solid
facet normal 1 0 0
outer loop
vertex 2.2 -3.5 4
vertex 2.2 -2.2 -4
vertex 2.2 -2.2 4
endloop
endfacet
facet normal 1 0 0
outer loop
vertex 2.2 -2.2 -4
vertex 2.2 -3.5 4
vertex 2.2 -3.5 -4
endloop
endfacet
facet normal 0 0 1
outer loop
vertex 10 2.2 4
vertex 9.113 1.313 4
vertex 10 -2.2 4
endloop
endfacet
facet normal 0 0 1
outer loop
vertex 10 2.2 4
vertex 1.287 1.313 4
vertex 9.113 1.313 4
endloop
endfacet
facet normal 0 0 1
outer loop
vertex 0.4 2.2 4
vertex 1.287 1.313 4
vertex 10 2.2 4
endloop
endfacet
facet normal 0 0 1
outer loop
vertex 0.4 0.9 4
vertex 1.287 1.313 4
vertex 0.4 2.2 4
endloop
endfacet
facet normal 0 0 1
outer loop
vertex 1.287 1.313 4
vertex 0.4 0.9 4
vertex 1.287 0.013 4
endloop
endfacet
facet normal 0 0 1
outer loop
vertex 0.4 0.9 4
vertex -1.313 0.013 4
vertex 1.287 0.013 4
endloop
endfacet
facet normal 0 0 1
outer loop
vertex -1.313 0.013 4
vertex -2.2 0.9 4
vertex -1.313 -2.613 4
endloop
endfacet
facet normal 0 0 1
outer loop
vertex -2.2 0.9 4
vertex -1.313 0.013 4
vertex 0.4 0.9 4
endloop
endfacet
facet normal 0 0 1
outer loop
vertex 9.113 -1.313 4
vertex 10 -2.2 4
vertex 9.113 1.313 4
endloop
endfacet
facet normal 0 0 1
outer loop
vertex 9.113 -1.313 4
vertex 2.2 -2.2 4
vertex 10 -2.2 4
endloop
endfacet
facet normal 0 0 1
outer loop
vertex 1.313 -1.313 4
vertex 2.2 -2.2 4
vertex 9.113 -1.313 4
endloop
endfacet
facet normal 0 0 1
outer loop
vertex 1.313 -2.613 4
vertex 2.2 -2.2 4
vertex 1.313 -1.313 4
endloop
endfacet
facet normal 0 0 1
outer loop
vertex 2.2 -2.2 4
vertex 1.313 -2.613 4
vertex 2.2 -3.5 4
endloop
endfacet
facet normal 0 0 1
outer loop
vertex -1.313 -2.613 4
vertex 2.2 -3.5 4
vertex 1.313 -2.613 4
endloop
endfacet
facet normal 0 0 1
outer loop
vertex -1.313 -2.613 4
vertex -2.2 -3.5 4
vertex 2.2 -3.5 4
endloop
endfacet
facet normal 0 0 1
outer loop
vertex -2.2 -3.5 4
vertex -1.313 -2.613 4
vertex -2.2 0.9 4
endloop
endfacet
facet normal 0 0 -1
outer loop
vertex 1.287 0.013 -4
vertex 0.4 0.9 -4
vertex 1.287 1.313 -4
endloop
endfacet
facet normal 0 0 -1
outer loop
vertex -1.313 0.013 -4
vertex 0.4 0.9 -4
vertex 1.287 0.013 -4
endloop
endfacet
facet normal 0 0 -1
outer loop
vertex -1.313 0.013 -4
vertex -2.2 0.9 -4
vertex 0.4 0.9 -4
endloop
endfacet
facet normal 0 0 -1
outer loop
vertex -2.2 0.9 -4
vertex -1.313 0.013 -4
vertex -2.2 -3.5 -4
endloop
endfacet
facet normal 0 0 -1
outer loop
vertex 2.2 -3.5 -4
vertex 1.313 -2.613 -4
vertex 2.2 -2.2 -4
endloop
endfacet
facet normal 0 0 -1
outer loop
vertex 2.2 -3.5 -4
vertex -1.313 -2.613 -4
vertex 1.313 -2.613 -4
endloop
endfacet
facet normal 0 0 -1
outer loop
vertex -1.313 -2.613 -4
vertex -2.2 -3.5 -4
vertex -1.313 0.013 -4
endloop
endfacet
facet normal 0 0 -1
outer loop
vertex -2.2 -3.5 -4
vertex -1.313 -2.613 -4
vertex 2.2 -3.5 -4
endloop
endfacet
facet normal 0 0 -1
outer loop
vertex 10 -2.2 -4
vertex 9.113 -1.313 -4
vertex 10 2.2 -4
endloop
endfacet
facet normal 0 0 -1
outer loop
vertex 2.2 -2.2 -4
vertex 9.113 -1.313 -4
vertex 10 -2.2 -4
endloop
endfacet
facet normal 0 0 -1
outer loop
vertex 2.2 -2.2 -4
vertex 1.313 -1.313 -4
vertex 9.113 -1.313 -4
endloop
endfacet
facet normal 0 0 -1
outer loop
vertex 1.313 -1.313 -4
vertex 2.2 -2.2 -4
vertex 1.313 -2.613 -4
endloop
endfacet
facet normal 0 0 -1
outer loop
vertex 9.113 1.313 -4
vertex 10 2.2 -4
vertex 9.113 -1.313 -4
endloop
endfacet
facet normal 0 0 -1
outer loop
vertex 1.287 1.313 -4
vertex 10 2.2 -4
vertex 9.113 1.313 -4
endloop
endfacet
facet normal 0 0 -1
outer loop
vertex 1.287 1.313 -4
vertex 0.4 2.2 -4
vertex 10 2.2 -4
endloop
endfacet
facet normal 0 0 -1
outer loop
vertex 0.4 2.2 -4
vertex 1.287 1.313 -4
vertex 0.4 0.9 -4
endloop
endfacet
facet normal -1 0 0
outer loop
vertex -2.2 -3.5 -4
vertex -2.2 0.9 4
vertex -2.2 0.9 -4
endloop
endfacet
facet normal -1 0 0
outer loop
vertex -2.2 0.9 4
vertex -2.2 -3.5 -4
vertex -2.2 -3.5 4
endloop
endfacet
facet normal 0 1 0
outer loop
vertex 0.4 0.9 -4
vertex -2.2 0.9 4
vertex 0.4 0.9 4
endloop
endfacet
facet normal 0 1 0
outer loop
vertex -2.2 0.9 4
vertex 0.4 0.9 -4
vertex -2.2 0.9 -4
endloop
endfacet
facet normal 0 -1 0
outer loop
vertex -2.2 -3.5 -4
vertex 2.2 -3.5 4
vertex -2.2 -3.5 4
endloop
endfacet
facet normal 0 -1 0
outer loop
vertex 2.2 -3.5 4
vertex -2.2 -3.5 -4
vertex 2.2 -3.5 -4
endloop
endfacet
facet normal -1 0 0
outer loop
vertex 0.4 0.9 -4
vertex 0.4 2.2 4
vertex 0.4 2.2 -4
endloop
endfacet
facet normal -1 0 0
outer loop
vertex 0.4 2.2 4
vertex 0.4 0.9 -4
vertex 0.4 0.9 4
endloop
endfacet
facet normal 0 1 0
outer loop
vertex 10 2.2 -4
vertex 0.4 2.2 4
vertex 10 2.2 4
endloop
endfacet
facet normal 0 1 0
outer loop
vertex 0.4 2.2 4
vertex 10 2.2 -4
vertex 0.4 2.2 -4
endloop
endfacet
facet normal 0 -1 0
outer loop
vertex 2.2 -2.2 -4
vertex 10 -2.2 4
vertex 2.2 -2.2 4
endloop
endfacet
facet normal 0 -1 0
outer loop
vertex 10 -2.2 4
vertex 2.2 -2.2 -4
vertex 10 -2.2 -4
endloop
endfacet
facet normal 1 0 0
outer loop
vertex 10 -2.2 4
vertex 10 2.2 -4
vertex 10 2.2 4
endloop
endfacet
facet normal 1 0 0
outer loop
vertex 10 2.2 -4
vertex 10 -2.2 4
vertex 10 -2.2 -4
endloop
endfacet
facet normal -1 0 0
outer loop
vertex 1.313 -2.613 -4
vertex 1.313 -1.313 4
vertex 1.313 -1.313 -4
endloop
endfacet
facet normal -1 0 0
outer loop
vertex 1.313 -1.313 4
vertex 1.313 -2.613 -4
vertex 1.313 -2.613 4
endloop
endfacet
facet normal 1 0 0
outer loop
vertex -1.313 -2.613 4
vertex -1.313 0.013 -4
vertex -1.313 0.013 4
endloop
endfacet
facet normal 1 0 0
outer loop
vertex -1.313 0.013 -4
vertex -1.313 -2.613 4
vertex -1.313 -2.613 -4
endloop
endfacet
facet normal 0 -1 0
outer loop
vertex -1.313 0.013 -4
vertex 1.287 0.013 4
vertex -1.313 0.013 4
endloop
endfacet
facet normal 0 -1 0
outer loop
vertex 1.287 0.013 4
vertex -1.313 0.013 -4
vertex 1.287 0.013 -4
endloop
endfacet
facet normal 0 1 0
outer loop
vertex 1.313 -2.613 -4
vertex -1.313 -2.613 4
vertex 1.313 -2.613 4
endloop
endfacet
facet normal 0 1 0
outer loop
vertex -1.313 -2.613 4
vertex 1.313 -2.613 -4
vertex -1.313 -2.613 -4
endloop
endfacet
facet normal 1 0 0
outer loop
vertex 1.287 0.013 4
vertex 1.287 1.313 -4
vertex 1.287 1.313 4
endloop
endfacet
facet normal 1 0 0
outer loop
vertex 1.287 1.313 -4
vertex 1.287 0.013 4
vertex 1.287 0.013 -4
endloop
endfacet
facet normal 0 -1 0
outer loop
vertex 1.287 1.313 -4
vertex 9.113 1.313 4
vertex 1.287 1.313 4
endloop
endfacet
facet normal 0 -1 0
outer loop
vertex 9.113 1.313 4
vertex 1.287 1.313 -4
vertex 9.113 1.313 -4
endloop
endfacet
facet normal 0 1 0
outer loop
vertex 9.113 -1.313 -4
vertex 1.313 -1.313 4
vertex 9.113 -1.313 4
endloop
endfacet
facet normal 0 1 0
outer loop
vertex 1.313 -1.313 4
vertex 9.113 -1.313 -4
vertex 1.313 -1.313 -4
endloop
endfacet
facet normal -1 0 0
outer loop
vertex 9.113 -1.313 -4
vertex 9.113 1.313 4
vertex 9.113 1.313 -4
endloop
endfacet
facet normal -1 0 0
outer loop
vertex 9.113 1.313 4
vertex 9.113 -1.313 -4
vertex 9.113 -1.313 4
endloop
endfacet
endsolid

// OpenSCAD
/**
* Machine Blocks
* https://machinemania.net/blocks 
*
* Plug Holder
* Copyright (c) 2022 Jan Philipp Knoeller <pk@pksoftware.de>
*
* Published under license:
* Creative Commons Attribution-NonCommercial-ShareAlike 4.0 International 
* https://creativecommons.org/licenses/by-nc-sa/4.0/
*
*/
outerWidth = 4.4;
cableEndWidth = 3.8;
plugWidth = 2.6;
height = 8;
cableEndHeight=0;
pins=[-1,0,0,0];

difference(){
        
    for (a = [ 0 : 1 : len(pins) - 1 ]){
        translate([a*plugWidth,pins[a]*0.5*plugWidth,-0.5*cableEndHeight]){
            cube([outerWidth, outerWidth, height], center=true);
            
            if(cableEndHeight > 0){
                translate([0,0,0.5*(height + cableEndHeight)]){
                       cube([cableEndWidth, cableEndWidth, cableEndHeight], center=true);
                }
            }
        }
    }

    for (a = [ 0 : 1 : len(pins) - 1 ]){
        translate([a*plugWidth,pins[a]*0.5*plugWidth,0]){
            cube([plugWidth*1.01, plugWidth*1.01, (height + cableEndHeight)*1.1], center=true);
        }
    }

}
